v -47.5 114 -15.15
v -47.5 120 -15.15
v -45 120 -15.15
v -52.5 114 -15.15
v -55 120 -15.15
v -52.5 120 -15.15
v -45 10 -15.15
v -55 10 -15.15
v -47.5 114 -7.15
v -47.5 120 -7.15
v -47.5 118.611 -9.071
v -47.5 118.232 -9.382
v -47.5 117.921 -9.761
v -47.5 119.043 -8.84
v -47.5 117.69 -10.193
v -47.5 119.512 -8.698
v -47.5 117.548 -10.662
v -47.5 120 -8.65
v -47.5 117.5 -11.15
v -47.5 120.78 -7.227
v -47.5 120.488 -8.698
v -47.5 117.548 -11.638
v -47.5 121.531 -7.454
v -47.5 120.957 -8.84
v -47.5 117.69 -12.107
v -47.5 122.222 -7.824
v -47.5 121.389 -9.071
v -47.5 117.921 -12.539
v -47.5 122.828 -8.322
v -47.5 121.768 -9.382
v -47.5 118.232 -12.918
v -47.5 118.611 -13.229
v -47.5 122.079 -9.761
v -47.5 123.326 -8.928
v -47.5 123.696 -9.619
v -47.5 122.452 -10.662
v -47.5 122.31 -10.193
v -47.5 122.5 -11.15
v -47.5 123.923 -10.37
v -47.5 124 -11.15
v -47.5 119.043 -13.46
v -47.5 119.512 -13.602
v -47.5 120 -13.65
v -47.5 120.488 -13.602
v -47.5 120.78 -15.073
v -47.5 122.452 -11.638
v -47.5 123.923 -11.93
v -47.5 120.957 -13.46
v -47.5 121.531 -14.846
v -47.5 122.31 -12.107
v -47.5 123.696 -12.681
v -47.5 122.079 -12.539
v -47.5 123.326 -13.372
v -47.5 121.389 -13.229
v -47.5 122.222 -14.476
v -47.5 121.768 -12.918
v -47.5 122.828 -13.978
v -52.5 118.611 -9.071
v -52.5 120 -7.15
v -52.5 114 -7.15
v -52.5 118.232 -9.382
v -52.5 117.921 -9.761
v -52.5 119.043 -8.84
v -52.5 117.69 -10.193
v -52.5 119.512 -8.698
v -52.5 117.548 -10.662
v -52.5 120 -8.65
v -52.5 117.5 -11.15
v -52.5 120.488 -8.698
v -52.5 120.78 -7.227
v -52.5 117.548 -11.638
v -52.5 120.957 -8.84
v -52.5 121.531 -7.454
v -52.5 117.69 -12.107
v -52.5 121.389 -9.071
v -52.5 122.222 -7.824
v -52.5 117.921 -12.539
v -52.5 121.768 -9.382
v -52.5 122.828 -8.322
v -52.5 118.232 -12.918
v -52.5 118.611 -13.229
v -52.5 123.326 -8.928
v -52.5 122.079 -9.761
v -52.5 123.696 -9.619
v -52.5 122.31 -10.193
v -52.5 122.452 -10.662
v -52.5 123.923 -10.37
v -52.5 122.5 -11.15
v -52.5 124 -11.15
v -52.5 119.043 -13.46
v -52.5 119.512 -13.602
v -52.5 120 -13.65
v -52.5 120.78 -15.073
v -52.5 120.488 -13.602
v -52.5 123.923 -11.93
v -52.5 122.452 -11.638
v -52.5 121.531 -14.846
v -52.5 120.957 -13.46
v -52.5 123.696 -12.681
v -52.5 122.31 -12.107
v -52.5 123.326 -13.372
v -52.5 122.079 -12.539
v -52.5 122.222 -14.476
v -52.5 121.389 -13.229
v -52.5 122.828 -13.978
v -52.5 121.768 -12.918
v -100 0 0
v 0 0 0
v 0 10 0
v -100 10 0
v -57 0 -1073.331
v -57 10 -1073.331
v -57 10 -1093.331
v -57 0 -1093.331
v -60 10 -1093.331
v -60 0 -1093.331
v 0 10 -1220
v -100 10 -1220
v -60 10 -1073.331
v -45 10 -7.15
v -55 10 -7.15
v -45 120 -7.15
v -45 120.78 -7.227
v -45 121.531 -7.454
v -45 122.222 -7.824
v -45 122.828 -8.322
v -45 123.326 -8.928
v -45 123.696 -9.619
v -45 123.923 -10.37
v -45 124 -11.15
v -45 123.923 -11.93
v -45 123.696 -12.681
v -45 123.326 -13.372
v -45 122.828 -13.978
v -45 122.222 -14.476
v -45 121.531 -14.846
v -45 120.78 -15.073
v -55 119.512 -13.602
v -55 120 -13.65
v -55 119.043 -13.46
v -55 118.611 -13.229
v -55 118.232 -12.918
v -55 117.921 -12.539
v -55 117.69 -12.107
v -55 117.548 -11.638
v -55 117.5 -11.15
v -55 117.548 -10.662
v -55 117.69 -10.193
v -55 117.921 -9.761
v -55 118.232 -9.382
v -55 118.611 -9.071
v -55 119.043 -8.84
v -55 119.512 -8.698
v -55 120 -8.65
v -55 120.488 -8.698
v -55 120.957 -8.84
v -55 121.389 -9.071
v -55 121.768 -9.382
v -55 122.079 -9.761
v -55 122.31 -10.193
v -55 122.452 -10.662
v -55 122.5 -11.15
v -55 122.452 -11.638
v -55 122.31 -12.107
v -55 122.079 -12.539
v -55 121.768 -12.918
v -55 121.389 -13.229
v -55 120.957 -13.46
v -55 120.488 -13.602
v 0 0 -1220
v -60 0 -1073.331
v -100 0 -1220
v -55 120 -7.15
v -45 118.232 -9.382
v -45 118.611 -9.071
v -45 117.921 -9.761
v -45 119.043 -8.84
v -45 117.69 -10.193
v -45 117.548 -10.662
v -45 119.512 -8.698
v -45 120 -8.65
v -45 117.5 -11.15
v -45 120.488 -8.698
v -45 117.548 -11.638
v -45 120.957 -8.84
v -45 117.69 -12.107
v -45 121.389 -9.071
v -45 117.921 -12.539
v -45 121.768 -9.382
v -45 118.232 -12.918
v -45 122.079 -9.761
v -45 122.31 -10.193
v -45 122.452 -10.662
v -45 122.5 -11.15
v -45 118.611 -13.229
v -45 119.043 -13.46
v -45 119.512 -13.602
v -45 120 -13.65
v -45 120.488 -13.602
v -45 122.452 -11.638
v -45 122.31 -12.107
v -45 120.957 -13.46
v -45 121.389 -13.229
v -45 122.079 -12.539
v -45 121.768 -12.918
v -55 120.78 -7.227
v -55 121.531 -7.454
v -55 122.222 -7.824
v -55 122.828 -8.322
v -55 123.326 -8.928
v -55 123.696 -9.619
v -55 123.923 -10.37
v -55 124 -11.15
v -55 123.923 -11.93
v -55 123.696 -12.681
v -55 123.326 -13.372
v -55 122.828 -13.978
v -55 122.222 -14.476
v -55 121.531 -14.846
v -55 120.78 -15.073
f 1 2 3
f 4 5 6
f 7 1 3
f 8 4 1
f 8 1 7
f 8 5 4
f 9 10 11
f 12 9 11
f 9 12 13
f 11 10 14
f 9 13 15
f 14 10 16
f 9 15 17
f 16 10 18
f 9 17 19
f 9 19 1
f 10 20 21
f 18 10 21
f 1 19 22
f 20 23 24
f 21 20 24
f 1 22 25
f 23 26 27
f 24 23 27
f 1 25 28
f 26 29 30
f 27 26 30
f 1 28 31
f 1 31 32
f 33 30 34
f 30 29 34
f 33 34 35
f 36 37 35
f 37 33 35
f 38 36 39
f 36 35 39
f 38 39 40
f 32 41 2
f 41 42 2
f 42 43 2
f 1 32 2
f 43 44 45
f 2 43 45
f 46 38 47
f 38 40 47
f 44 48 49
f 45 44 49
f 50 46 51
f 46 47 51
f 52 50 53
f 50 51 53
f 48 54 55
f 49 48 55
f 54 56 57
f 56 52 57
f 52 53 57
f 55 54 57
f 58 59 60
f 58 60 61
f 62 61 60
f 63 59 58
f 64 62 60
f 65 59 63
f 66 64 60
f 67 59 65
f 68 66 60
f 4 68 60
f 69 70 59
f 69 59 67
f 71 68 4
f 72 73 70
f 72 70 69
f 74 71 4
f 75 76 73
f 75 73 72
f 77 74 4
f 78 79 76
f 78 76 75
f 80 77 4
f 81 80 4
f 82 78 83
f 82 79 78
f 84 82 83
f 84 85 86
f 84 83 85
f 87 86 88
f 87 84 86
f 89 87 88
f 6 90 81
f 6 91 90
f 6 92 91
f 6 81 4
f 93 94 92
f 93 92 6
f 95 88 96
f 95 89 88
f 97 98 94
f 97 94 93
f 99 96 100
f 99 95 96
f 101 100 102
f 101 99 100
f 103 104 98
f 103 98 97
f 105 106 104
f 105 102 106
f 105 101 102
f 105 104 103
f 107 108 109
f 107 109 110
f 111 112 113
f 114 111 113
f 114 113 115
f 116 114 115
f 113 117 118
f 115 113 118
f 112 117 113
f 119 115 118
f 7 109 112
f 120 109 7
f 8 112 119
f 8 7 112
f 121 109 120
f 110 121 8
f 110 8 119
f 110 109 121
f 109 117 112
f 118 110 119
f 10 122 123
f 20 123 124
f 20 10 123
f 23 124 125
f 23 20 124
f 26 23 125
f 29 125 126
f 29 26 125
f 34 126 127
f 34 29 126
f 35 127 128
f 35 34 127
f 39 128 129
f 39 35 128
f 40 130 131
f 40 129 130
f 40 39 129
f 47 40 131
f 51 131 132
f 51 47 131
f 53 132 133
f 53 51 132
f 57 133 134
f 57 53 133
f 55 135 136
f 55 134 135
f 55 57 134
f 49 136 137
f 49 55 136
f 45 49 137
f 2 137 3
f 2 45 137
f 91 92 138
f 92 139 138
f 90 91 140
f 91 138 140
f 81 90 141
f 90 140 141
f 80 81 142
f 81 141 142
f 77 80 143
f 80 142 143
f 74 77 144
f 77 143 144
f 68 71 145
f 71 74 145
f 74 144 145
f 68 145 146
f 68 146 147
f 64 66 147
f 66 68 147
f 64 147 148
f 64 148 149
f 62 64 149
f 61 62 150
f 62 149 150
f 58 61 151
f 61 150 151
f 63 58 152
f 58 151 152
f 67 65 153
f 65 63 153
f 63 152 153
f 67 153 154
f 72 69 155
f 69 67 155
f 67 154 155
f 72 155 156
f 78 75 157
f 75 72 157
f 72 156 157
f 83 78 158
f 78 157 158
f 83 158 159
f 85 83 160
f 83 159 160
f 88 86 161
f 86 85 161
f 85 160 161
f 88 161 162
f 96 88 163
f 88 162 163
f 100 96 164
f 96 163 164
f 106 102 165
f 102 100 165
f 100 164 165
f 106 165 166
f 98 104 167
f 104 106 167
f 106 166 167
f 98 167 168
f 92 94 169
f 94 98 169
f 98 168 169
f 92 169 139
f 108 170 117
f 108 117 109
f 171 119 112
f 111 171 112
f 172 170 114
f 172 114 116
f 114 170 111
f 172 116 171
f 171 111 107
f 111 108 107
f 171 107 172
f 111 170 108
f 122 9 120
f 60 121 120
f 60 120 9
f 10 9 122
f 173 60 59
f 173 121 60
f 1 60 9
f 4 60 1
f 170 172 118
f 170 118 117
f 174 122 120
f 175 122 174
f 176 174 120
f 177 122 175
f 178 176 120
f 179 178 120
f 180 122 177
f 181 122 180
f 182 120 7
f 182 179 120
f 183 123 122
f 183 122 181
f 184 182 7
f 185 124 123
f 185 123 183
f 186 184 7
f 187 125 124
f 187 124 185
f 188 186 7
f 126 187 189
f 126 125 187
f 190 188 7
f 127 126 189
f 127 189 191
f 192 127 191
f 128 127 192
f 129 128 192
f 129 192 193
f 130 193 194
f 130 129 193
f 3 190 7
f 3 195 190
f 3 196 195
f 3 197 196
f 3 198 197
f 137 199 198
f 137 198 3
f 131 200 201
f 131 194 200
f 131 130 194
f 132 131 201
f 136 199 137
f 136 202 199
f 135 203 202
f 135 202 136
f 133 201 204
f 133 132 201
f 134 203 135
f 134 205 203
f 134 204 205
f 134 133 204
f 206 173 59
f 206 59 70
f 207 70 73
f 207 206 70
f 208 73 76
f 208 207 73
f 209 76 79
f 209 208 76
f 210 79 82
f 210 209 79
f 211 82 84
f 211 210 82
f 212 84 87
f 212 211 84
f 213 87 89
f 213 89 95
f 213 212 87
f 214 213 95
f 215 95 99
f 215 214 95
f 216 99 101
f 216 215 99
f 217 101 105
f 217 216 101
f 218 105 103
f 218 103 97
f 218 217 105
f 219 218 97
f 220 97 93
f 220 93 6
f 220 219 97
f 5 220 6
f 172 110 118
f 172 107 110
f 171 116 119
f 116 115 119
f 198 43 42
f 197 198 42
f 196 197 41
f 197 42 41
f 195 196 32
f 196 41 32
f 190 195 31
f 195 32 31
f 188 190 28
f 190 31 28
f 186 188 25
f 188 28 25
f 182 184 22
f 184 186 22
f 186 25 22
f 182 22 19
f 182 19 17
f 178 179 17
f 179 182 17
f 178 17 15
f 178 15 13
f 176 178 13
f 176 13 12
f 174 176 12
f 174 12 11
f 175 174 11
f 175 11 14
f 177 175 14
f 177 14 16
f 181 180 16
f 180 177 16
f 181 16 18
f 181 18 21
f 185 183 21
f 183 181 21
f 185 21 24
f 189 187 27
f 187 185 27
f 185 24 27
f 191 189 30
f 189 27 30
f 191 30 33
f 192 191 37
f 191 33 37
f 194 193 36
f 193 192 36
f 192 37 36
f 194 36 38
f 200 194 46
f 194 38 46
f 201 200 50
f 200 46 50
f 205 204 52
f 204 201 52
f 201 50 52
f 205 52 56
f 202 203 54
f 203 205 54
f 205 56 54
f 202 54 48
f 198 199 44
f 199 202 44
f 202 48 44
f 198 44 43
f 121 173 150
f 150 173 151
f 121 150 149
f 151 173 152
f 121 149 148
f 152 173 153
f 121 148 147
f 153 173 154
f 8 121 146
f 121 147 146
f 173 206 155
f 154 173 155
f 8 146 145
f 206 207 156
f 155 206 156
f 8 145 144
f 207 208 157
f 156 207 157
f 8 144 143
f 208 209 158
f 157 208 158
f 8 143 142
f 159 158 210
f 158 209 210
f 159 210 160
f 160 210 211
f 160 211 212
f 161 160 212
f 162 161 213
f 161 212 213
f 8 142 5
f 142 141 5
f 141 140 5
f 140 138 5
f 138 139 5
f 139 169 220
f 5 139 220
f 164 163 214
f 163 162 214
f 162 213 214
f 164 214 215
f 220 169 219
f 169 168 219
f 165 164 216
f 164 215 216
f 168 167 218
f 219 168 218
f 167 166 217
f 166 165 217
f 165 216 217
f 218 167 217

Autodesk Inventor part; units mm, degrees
ref_plane "YZ Plane" through (0, 0, 0) normal (1, 0, 0) x (0, 1, 0)
ref_plane "XZ Plane" through (0, 0, 0) normal (0, 1, 0) x (-1, 0, 0)
ref_plane "XY Plane" through (0, 0, 0) normal (0, 0, 1) x (1, 0, 0)
sketch "Sketch1" plane through (0, 0, 0) normal (0, 1, 0) x (-1, 0, 0)
  line L0 (0, 0) -> (100, 0)
  line L1 (100, 0) -> (100, -1220)
  line L2 (100, -1220) -> (0, -1220)
  line L3 (0, -1220) -> (0, 0)
  dimension "d0" = 100
  dimension "d1" = 1220
extrude "Extrusion1" add sketch "Sketch1" along normal blind 10
ref_plane "Work Plane1" through (-50, 0, 0) normal (1, 0, 0) x (0, 0, -1)
sketch "Sketch3" plane through (-50, 0, 0) normal (1, 0, 0) x (0, 0, -1)
  line L0 (1220, 0) -> (0, 0) projected
  line L1 (1220, 0) -> (1220, 10) projected
  line L2 (0, 10) -> (1220, 10) projected
  line L3 (0, 0) -> (0, 10) projected
  line L4 (1220, 10) -> (0, 10) projected
  line L5 (0, 10) -> (11.15, 10)
  circle A0 centre (11.15, 120) radius 2.5
  arc A1 (15.15, 120) -> (7.15, 120) centre (11.15, 120) ccw
  line L6 (15.15, 120) -> (15.15, 10)
  line L7 (15.15, 10) -> (7.15, 10)
  line L8 (7.15, 10) -> (7.15, 120)
  dimension "d18" = 11.15
  dimension "d21" = 5
  dimension "d22" = 8
  dimension "d24" = 8
  dimension "d31" = 110
extrude "Extrusion3" add sketch "Sketch3" along normal mid plane 10 contours L2 L8 A1 L6
sketch "Sketch4" plane through (-50, 0, 0) normal (1, 0, 0) x (0, 0, -1)
  arc A0 (15.15, 120) -> (7.15, 120) centre (11.15, 120) ccw projected
  circle A1 centre (11.15, 120) radius 2.5 projected
  line L0 (7.15, 120) -> (7.15, 10) projected
  line L1 (15.15, 124) -> (7.15, 124)
  line L2 (7.15, 124) -> (7.15, 114)
  line L3 (7.15, 114) -> (15.15, 114)
  line L4 (15.15, 114) -> (15.15, 124)
  point P0 (0, 0)
  dimension "d27" = 10
  dimension "d30" = 4
extrude "Extrusion4" cut sketch "Sketch4" along normal mid plane 5
sketch "Sketch5" plane through (0, 10, 0) normal (0, 1, 0) x (1, 0, 0)
  line L0 (-60, 1073.331) -> (-57, 1073.331)
  line L1 (-57, 1073.331) -> (-57, 1093.331)
  line L2 (-57, 1093.331) -> (-60, 1093.331)
  line L3 (-60, 1093.331) -> (-60, 1073.331)
  line L4 (-100, 1220) -> (-100, 0) projected
  line L5 (0, 1220) -> (-100, 1220) projected
  point P0 (0, 0)
  dimension "d32" = 3
  dimension "d33" = 20
  dimension "d34" = 40
  dimension "d35" = 126.669
extrude "Extrusion5" cut sketch "Sketch5" against normal blind 10
properties part number "Base_015"
